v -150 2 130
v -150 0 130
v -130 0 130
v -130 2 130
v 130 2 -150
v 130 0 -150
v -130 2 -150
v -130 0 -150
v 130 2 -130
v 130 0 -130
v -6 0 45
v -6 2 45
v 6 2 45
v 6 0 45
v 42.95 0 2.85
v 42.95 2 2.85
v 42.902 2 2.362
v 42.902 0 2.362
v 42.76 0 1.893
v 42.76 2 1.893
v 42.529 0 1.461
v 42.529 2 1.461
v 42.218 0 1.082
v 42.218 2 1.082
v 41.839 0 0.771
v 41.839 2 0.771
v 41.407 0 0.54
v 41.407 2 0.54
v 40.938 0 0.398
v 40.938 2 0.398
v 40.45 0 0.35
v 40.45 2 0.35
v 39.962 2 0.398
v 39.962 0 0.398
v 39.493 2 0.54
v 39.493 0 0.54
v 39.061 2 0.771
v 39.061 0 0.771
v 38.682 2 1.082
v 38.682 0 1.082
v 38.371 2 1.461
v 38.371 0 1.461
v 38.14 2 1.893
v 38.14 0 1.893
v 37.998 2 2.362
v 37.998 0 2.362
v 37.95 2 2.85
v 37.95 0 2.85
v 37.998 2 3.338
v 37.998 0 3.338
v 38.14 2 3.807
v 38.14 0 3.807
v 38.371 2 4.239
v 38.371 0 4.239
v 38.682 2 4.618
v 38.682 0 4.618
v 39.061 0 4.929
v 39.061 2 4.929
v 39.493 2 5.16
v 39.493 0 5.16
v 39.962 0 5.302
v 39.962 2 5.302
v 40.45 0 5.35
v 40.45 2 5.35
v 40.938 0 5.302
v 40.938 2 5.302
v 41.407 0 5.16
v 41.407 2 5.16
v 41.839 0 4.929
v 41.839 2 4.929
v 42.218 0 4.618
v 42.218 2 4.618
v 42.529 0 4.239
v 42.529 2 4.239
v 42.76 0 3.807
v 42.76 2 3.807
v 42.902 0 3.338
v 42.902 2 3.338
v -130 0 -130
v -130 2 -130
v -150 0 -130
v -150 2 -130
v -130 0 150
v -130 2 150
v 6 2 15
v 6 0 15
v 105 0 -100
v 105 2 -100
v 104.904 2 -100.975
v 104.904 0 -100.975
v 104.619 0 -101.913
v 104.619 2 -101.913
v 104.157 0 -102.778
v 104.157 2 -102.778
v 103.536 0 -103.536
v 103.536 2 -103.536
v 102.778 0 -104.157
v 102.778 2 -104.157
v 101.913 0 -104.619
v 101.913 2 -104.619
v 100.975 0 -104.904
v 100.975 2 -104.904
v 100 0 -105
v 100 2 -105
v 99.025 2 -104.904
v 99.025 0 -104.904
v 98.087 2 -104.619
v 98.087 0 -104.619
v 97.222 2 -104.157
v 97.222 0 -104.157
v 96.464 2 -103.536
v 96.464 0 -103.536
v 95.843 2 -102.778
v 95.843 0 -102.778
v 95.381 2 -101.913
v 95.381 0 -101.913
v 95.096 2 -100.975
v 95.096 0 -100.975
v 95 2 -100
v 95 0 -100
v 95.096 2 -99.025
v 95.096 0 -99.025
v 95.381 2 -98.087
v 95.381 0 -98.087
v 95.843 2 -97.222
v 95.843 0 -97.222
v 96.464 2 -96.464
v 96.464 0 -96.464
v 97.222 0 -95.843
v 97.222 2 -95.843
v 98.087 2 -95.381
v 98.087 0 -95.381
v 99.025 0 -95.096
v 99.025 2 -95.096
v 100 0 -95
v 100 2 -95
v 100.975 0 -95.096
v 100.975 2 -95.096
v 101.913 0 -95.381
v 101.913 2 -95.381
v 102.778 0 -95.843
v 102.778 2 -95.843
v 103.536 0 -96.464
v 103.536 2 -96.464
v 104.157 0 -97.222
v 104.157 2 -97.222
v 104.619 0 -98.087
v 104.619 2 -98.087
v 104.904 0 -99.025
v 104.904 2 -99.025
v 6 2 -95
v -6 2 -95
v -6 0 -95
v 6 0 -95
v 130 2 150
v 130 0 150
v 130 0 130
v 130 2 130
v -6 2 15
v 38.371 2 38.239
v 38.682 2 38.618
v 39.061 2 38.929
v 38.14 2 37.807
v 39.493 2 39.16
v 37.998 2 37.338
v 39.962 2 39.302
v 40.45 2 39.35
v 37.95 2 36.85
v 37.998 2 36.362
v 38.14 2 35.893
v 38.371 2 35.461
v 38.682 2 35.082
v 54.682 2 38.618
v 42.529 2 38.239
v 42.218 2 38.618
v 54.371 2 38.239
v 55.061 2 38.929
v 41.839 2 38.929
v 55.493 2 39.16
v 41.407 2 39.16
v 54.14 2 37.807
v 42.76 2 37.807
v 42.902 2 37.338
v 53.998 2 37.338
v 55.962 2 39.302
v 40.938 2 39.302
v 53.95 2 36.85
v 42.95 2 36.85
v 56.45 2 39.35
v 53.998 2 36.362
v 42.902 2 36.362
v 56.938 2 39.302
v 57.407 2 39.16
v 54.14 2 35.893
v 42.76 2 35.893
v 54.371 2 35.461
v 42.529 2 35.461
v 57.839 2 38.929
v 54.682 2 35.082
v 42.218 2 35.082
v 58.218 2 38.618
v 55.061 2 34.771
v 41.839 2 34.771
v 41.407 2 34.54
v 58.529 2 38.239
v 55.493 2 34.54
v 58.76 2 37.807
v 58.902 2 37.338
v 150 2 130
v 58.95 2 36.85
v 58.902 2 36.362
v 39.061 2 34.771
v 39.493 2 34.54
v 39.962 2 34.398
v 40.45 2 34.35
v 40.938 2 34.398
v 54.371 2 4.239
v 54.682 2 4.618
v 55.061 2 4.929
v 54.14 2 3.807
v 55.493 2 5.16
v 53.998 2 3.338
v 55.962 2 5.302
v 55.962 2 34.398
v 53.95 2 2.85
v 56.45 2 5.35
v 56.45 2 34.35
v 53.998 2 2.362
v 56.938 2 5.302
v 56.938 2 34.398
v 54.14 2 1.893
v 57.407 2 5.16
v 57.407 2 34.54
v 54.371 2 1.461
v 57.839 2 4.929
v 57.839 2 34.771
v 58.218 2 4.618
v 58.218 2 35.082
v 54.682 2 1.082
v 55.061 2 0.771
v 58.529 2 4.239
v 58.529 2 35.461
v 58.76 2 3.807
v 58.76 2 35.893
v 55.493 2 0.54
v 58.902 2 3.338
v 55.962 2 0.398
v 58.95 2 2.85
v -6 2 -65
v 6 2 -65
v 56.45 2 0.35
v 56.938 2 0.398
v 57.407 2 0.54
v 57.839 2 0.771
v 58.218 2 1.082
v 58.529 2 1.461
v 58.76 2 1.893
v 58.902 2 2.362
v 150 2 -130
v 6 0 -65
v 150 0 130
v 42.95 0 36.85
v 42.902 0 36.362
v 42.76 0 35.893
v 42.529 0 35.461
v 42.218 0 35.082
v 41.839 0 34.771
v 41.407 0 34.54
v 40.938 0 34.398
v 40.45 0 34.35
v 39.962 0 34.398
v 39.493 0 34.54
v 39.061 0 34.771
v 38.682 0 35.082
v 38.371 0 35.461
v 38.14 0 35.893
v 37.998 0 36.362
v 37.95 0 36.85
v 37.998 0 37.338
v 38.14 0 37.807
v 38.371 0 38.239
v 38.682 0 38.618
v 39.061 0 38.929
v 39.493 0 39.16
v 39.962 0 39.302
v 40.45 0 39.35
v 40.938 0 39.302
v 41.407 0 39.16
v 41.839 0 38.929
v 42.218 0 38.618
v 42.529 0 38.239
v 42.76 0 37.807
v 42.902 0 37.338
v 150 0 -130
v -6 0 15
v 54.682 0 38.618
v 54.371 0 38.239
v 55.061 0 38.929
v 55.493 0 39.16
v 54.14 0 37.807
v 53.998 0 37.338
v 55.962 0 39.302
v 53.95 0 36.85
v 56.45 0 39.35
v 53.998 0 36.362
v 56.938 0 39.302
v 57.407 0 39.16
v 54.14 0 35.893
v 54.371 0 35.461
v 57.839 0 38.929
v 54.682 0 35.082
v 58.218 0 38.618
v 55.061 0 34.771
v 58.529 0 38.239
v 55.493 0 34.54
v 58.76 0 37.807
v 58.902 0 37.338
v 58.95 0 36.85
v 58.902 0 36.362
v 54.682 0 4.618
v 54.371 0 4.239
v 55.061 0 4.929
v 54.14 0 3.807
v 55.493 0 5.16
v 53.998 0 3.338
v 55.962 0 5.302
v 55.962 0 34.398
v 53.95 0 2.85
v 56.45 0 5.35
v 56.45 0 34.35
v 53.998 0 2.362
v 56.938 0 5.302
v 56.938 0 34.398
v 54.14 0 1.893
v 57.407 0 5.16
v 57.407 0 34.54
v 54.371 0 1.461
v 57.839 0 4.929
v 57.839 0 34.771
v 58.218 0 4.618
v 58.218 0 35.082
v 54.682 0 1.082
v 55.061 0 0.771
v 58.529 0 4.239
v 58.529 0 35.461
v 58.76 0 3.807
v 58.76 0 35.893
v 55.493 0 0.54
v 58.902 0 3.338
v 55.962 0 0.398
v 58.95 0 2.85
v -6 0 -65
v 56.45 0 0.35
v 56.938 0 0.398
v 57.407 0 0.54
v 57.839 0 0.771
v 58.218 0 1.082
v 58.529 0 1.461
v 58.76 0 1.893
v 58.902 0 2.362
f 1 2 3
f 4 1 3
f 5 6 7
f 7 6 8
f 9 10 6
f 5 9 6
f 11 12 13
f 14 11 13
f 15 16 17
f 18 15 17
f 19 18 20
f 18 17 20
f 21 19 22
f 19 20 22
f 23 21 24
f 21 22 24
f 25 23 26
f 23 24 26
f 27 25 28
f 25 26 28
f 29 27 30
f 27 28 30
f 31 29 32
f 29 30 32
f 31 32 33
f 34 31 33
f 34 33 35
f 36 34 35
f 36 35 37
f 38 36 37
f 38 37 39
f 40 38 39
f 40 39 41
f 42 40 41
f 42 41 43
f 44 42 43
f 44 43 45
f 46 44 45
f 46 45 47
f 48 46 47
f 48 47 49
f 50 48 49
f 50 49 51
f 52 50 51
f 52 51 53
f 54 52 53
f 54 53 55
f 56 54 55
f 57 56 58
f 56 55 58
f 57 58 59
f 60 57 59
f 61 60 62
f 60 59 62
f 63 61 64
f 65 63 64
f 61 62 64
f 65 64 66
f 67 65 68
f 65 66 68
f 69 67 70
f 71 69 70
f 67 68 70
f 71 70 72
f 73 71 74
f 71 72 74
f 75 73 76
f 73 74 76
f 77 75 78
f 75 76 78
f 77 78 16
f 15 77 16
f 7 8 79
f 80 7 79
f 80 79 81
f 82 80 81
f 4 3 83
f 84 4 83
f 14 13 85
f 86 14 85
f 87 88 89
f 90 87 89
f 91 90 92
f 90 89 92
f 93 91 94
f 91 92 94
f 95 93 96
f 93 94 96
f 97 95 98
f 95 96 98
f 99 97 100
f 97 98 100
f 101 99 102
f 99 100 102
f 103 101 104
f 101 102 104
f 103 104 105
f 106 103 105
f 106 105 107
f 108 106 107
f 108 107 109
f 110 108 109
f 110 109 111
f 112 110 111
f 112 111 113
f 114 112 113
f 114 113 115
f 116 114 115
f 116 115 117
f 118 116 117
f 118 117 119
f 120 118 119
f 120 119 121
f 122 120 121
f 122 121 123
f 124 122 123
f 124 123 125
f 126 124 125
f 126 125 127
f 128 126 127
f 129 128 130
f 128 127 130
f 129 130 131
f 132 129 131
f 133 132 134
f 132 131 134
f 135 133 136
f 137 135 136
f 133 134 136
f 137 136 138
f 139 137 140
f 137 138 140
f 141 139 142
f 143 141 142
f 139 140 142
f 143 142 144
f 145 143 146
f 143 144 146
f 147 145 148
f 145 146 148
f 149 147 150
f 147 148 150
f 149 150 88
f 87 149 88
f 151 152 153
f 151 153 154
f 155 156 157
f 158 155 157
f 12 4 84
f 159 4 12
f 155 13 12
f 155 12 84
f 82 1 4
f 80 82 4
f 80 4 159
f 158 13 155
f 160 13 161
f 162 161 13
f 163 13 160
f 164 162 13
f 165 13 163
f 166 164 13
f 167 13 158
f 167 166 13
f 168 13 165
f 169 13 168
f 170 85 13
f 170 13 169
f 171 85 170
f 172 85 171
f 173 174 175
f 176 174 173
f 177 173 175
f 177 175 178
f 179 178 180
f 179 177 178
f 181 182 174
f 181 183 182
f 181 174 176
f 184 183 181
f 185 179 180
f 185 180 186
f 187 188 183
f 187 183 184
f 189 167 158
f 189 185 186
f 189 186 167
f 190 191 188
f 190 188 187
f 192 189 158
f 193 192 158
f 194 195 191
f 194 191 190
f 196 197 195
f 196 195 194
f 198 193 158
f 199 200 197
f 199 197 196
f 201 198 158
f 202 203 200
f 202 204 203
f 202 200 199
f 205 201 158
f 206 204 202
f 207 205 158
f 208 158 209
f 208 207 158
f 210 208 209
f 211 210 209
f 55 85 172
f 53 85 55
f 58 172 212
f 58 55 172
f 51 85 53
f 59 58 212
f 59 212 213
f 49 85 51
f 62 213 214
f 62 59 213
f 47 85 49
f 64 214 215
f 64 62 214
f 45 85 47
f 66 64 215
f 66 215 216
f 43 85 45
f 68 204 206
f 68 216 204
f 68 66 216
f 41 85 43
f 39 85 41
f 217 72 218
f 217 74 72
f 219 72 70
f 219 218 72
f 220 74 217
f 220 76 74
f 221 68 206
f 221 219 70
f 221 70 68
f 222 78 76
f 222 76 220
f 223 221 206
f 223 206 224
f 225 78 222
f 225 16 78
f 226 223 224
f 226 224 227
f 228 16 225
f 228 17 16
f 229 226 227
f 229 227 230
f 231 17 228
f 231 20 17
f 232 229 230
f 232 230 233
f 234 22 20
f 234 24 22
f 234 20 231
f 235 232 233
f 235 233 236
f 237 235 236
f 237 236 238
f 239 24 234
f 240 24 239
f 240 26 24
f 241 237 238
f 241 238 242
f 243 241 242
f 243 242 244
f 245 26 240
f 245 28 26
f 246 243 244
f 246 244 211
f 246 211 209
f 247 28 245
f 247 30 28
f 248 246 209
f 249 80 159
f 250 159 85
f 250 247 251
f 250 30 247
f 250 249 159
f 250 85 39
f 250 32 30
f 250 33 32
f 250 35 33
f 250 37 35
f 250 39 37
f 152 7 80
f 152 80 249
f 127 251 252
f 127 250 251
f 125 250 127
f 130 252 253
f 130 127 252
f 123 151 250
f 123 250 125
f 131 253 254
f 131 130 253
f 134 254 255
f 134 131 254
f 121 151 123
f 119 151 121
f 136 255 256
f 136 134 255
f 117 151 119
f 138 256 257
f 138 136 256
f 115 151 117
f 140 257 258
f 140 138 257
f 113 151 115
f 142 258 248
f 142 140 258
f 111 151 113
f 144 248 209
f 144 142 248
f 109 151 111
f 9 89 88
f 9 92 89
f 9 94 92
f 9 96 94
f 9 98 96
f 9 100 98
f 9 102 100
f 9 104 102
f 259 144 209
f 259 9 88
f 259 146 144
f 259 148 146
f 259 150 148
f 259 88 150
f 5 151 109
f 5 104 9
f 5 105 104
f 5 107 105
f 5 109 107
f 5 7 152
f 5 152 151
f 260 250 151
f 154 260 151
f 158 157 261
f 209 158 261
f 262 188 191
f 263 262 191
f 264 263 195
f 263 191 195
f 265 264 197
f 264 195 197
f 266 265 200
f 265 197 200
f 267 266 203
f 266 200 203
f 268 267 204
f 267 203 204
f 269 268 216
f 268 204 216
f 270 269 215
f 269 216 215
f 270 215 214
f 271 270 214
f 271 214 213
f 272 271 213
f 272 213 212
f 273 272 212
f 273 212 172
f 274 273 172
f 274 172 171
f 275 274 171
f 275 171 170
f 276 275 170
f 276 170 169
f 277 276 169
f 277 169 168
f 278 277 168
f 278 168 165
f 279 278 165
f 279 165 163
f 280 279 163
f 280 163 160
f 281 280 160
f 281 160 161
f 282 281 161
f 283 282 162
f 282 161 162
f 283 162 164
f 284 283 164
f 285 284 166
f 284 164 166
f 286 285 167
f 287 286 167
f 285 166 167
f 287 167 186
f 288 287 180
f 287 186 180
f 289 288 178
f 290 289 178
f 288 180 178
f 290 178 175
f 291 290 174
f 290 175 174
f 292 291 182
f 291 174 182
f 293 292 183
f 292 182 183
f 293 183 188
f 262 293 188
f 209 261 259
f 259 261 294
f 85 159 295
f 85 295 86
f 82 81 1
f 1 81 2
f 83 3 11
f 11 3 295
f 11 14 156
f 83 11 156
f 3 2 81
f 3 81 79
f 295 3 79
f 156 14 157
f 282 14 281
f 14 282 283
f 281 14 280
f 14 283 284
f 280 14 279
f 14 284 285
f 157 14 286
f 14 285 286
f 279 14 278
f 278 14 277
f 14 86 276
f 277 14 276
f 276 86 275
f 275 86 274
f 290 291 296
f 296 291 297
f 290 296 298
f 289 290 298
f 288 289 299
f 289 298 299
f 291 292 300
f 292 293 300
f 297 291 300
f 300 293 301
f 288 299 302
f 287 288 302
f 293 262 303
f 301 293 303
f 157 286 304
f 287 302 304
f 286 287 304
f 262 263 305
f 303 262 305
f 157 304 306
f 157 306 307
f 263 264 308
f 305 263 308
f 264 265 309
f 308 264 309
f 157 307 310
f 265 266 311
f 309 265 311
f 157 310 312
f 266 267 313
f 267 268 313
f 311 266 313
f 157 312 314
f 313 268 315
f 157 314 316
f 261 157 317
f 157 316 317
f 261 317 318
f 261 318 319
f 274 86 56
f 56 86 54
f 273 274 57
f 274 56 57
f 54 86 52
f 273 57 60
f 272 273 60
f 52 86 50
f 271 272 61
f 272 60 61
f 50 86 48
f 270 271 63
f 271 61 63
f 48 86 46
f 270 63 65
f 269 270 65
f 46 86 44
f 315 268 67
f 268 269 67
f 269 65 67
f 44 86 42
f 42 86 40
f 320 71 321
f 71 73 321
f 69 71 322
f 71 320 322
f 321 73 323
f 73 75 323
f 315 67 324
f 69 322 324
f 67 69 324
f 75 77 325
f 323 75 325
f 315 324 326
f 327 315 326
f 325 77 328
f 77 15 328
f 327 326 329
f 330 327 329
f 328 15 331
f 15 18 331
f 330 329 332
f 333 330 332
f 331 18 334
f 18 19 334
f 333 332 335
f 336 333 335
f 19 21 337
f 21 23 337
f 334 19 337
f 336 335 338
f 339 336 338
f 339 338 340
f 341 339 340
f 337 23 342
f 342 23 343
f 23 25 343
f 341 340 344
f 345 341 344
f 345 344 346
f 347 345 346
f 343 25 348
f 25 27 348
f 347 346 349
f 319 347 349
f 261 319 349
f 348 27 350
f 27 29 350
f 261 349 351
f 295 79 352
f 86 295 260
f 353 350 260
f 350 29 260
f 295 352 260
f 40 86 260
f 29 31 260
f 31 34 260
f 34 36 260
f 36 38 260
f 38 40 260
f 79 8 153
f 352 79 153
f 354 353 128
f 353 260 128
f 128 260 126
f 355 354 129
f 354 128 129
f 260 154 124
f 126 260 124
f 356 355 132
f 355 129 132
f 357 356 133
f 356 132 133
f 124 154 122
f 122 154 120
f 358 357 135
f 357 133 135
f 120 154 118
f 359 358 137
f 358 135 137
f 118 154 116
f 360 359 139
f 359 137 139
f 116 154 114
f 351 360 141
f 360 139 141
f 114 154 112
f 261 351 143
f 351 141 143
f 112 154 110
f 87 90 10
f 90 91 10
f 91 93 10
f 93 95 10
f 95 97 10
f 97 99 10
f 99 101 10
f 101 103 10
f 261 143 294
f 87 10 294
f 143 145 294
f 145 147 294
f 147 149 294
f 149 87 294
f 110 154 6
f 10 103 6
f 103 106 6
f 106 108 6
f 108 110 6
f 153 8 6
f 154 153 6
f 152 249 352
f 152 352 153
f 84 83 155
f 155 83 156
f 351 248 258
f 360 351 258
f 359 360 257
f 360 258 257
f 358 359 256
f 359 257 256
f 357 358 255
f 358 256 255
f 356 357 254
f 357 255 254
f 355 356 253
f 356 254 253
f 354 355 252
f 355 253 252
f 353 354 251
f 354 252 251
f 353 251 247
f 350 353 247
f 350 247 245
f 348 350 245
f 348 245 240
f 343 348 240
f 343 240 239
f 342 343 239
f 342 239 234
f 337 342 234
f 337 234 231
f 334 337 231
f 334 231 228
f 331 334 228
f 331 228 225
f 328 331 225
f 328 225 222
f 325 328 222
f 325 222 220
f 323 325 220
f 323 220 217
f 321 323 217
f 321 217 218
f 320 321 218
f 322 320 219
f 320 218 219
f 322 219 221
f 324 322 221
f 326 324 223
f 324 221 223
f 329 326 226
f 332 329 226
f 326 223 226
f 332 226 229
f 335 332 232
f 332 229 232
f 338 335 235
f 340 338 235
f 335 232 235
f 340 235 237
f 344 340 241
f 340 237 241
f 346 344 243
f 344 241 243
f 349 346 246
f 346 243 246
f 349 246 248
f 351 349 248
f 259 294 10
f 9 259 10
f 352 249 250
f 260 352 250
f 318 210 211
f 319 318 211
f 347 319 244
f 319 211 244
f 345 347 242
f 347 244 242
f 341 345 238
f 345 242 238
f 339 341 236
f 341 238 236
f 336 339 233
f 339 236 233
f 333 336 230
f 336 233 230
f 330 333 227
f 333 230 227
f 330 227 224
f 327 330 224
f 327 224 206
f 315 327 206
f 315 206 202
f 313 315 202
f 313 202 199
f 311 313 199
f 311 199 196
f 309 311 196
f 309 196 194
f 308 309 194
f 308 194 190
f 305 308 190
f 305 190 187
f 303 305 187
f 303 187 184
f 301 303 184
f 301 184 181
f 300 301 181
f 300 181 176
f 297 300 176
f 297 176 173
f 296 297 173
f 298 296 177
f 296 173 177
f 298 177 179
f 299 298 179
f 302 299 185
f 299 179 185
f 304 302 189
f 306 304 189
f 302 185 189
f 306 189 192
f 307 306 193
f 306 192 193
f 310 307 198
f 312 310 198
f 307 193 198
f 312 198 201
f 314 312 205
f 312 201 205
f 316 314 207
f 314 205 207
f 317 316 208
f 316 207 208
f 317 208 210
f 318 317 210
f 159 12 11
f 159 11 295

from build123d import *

# Parameters (mm, degrees)
BOSS_EXTRUDE1_DEPTH = 2
SKETCH2_R           = 5
SKETCH2_R_2         = 2.5
SKETCH2_W           = 12
SKETCH2_H           = 30
CUT_EXTRUDE1_DEPTH  = 10


with BuildPart() as part:
    # Sketch1 → Boss-Extrude1 (new body)
    with BuildSketch(Plane(origin=(0, 0, 0), x_dir=(1, 0, 0), z_dir=(0, 1, 0))):
        Polygon((-130, 150), (-130, 130), (-150, 130), (-150, -130), (-130, -130), (-130, -150), (130, -150), (130, -130), (150, -130), (150, 130), (130, 130), (130, 150), align=None)
    extrude(amount=BOSS_EXTRUDE1_DEPTH)

    # Sketch2 → Cut-Extrude1 (cut)
    with BuildSketch(Plane(origin=(0, 2, 0), x_dir=(1, 0, 0), z_dir=(0, 1, 0))):
        with Locations((100, 100)):
            Circle(SKETCH2_R)
        with Locations((56.45, -2.85)):
            Circle(SKETCH2_R_2)
        with Locations((40.45, -2.85)):
            Circle(SKETCH2_R_2)
        with Locations((40.45, -36.85)):
            Circle(SKETCH2_R_2)
        with Locations((56.45, -36.85)):
            Circle(SKETCH2_R_2)
        with Locations((0, -30)):
            Rectangle(SKETCH2_W, SKETCH2_H)
        with Locations((0, 80)):
            Rectangle(SKETCH2_W, SKETCH2_H)
    extrude(amount=-CUT_EXTRUDE1_DEPTH, mode=Mode.SUBTRACT)


solid = part.part
